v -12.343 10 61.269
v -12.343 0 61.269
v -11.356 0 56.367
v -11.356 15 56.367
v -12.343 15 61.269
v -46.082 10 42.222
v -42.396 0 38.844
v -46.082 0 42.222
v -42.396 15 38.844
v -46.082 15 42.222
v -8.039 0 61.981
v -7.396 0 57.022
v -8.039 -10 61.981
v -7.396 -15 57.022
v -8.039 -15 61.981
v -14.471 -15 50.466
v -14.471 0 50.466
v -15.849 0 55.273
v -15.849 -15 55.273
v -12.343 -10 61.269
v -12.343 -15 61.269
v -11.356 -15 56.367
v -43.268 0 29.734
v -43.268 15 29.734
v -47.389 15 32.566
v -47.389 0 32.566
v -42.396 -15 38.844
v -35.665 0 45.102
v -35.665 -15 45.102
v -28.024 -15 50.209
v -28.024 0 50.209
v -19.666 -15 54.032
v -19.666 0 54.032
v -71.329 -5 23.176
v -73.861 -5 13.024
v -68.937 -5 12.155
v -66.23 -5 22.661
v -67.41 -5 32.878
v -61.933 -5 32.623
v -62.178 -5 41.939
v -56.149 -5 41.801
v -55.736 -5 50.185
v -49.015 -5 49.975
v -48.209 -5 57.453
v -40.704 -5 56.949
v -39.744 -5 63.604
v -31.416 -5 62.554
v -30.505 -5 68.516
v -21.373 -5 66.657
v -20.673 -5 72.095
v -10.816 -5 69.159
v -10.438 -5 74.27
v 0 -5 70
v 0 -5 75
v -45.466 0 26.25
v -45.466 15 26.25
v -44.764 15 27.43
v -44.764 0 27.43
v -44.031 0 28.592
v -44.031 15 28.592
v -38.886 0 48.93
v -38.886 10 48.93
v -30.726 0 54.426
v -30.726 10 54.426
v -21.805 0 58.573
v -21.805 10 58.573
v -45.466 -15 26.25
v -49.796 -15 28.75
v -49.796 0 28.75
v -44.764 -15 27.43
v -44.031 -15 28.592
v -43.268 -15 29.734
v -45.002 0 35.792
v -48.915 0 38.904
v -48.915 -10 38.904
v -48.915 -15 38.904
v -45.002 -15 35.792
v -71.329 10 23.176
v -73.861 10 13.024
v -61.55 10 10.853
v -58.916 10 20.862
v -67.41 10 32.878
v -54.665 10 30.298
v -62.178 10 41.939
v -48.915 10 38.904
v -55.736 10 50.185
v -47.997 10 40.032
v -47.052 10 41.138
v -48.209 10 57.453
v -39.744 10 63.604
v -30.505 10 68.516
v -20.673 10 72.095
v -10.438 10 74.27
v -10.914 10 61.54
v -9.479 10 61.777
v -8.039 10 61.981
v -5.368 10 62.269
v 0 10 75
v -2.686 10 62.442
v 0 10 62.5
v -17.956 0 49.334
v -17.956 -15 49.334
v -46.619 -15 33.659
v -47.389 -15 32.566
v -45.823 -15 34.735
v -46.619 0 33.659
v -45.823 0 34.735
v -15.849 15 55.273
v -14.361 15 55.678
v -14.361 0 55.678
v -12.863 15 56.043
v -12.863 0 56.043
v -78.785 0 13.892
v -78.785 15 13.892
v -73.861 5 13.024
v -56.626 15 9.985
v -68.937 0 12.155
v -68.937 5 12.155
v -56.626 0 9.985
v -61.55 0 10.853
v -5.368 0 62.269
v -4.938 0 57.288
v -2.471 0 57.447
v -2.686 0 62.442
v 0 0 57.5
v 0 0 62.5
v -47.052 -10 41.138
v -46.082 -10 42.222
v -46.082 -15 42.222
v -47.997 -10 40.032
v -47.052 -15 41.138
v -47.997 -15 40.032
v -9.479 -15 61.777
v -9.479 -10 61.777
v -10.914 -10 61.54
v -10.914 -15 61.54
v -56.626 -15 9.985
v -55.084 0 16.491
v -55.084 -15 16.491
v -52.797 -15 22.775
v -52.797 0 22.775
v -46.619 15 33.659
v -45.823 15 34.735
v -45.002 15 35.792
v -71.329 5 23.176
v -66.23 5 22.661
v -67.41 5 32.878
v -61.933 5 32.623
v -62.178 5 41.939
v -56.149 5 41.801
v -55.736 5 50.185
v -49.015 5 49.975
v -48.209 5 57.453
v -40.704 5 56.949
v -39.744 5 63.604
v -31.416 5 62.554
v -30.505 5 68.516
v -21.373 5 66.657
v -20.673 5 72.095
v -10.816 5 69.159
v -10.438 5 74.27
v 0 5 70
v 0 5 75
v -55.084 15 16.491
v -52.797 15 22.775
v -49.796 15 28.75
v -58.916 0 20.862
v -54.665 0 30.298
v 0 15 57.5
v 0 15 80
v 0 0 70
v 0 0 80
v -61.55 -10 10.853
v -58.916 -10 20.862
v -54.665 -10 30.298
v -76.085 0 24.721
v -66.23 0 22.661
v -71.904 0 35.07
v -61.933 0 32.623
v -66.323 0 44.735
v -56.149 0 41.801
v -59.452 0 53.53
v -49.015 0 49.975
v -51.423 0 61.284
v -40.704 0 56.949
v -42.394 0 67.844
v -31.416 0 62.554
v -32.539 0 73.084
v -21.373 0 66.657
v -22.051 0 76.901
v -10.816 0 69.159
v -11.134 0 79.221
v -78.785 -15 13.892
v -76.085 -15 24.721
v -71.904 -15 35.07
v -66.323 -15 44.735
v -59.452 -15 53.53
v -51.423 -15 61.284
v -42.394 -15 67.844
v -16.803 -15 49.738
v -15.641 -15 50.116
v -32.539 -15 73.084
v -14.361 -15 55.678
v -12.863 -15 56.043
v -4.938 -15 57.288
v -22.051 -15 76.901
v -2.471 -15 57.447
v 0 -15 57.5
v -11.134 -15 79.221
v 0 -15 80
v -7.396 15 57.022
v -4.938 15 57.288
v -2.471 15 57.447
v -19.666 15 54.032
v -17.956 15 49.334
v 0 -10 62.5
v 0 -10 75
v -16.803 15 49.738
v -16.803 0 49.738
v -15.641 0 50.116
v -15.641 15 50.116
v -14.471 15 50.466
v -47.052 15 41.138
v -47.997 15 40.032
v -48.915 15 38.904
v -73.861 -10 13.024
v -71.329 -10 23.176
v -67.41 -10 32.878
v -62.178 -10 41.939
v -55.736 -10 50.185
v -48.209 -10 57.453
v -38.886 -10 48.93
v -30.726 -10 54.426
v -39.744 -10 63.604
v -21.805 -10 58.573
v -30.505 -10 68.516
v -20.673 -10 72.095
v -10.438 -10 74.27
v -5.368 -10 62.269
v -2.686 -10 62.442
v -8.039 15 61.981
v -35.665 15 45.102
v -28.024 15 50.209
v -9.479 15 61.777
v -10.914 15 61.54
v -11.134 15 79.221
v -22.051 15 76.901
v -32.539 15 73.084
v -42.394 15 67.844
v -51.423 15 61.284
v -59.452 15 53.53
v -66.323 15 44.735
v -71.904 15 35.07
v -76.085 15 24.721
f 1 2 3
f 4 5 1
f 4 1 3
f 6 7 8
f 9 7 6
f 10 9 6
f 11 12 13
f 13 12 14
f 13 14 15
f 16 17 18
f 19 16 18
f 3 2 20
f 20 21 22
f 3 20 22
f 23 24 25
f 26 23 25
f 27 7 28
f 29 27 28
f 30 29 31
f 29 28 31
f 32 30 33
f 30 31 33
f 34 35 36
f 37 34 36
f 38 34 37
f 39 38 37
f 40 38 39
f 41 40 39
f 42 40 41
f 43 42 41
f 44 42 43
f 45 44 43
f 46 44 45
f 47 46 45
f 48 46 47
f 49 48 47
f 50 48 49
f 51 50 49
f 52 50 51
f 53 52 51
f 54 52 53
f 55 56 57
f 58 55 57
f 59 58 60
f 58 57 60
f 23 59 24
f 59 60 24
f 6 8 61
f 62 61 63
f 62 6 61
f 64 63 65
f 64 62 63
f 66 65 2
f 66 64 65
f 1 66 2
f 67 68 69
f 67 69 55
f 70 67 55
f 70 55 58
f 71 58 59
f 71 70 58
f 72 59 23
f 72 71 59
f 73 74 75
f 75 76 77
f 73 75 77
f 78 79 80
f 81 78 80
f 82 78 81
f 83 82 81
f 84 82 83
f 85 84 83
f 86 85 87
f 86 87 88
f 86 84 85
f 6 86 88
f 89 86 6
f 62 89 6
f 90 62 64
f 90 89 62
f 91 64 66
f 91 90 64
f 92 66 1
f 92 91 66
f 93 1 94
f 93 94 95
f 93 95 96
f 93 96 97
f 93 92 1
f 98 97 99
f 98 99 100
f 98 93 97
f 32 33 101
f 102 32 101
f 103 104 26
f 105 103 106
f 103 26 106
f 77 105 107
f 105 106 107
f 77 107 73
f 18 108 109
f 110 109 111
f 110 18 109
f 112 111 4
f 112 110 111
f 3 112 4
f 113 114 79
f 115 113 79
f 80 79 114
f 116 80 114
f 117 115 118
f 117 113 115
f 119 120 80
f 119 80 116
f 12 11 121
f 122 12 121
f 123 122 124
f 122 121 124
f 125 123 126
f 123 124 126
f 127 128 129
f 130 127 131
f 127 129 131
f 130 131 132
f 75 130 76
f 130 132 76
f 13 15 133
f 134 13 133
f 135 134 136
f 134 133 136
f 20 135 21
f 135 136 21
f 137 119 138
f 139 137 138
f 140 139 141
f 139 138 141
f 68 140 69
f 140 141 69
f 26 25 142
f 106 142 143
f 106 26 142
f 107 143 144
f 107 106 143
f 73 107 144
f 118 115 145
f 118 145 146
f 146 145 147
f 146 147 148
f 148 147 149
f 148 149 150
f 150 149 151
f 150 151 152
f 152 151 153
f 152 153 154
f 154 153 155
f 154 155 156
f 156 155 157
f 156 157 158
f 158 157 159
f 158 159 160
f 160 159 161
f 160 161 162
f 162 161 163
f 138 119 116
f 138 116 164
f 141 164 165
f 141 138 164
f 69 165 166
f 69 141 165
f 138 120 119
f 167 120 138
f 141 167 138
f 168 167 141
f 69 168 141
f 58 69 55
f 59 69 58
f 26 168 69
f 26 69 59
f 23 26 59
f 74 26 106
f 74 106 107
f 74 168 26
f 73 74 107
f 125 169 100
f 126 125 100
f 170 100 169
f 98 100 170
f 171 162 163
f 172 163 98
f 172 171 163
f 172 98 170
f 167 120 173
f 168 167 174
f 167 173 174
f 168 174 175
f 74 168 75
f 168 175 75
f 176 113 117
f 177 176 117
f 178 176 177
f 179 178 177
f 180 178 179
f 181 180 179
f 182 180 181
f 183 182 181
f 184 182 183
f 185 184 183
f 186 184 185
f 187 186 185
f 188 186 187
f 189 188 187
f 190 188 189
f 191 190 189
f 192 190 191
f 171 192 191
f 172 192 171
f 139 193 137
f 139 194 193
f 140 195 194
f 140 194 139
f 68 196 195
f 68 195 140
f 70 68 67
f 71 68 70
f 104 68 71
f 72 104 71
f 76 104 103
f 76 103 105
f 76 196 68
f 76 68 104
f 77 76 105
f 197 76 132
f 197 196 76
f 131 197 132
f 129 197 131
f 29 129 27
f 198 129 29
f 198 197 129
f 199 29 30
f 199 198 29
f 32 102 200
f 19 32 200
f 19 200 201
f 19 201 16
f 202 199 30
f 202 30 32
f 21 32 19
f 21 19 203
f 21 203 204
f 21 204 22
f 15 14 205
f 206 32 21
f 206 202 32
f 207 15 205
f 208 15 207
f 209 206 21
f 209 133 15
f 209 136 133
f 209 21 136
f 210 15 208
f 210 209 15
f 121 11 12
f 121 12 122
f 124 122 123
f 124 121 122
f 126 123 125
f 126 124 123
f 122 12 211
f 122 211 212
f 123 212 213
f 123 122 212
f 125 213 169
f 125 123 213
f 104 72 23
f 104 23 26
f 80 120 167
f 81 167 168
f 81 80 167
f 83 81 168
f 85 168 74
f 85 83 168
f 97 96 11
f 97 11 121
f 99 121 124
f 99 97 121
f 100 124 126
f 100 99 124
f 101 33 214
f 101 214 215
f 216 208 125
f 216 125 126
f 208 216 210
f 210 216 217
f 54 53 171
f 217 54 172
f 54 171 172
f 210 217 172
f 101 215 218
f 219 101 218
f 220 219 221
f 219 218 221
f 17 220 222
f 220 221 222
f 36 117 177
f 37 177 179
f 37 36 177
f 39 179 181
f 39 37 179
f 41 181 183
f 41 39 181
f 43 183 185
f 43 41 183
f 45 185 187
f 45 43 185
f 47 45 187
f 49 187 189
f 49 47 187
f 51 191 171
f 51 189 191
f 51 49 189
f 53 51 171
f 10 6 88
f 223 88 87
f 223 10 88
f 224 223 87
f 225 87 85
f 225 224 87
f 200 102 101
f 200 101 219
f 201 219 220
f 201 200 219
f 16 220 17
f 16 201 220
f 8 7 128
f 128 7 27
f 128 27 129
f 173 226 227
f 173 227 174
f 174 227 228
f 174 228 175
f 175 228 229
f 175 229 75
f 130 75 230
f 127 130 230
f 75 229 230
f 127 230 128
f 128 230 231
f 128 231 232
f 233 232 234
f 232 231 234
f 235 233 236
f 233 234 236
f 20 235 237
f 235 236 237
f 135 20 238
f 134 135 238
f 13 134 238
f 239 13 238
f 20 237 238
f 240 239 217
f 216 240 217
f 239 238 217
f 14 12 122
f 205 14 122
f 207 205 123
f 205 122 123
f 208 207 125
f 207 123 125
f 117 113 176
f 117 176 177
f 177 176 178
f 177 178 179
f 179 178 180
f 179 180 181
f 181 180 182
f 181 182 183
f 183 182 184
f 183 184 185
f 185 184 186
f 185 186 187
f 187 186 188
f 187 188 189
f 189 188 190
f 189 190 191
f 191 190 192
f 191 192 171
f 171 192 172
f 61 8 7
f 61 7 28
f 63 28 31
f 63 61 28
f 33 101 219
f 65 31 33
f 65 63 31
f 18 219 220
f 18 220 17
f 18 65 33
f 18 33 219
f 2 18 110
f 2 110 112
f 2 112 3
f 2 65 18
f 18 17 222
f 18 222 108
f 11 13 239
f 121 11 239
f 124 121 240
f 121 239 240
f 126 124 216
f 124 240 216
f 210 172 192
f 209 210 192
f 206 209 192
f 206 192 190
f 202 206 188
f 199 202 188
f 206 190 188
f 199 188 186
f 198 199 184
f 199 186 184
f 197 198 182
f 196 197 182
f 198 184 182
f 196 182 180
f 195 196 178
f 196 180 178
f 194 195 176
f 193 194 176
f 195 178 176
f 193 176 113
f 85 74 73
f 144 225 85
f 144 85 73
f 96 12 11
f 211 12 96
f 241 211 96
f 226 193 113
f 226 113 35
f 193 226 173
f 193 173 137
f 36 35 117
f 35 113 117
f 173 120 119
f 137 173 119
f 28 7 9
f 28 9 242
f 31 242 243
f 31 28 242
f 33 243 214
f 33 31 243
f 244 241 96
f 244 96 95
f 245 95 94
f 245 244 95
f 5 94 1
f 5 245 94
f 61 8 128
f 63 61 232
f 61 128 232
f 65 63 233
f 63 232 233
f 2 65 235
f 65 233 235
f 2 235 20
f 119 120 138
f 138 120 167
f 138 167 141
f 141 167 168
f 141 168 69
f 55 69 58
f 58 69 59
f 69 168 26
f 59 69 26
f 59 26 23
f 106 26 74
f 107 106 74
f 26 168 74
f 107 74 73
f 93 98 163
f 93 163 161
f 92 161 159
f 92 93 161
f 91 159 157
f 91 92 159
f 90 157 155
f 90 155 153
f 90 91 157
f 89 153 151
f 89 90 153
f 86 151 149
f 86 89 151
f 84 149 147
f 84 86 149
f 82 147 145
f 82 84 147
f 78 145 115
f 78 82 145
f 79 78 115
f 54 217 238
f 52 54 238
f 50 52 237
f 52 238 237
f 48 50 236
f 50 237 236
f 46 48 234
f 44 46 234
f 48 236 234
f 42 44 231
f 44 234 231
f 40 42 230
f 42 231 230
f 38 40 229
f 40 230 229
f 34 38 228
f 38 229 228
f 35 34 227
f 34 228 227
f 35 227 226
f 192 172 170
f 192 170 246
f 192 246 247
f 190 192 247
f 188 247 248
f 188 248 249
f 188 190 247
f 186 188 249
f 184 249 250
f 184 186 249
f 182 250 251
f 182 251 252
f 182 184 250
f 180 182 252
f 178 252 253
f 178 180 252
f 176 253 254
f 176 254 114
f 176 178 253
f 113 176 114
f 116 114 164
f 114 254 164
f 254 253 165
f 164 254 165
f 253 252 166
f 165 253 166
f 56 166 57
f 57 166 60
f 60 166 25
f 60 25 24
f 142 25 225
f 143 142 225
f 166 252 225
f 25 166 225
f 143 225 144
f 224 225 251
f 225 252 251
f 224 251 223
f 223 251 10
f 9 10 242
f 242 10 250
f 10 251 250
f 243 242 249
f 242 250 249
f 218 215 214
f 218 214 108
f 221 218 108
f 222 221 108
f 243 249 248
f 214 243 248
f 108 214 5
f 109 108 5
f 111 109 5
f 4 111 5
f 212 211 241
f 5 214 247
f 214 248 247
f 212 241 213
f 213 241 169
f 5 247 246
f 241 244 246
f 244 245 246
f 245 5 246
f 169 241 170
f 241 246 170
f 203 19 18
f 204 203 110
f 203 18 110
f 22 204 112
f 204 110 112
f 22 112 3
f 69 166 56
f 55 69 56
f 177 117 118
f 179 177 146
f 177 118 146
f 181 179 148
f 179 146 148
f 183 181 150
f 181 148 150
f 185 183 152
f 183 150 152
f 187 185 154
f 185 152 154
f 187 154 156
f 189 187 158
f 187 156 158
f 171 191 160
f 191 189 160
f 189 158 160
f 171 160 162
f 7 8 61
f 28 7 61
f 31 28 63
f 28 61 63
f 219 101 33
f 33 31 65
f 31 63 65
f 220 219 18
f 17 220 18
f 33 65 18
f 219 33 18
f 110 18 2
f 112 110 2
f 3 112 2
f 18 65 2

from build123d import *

# Parameters (mm, degrees)
F1_DEPTH = 10
F3_DEPTH = 5
F5_DEPTH = 15
F8_DEPTH = 15
F9_DEPTH = 25


# Not quite as in the source:
# - a feature names something its author has since deleted; it is built from what else it names


with BuildPart() as f1:
    # F0 (on Front) → F1 (new body, symmetric)
    with BuildSketch(Plane.XZ):
        with BuildLine():
            Line((-62.5, -30), (-62.5, 0))
            Line((-62.5, 0), (-75, 0))
            ThreePointArc((-75, 0), (-73.4179734698, -15.3232232767), (-68.7386354243, -30))
            Line((-68.7386354243, -30), (-62.5, -30))
        make_face()
        with BuildLine():
            ThreePointArc((-68.7386354243, -30), (-73.4179734698, -15.3232232767), (-75, 0))
            Line((-75, 0), (-75, -30))
            Line((-75, -30), (-68.7386354243, -30))
        make_face()
        with BuildLine():
            Line((-75, 0), (-62.5, 0))
            ThreePointArc((-62.5, 0), (-44.1941738242, 44.1941738242), (0, 62.5))
            Line((0, 62.5), (0, 75))
            ThreePointArc((0, 75), (-53.033008589, 53.033008589), (-75, 0))
        make_face()
        with BuildLine():
            ThreePointArc((0, 62.5), (23.9177145228, 57.742470782), (44.1941738242, 44.1941738242))
            Line((44.1941738242, 44.1941738242), (44.1941738242, 56.6941738242))
            Line((44.1941738242, 56.6941738242), (49.0995993303, 56.6941738242))
            ThreePointArc((49.0995993303, 56.6941738242), (26.2005435362, 70.274686185), (0, 75))
            Line((0, 75), (0, 62.5))
        make_face()
        with BuildLine():
            Line((44.1941738242, 56.6941738242), (44.1941738242, 44.1941738242))
            Line((44.1941738242, 44.1941738242), (53.033008589, 53.033008589))
            ThreePointArc((53.033008589, 53.033008589), (51.0991040315, 54.8988302897), (49.0995993303, 56.6941738242))
            Line((49.0995993303, 56.6941738242), (44.1941738242, 56.6941738242))
        make_face()
        with BuildLine():
            ThreePointArc((49.0995993303, 56.6941738242), (51.0991040315, 54.8988302897), (53.033008589, 53.033008589))
            ThreePointArc((53.033008589, 53.033008589), (56.9861303035, 48.7604445533), (60.5959982177, 44.1941738242))
            Line((60.5959982177, 44.1941738242), (79.1941738242, 44.1941738242))
            Line((79.1941738242, 44.1941738242), (79.1941738242, 56.6941738242))
            Line((79.1941738242, 56.6941738242), (49.0995993303, 56.6941738242))
        make_face()
        with BuildLine():
            Line((53.033008589, 53.033008589), (44.1941738242, 44.1941738242))
            Line((44.1941738242, 44.1941738242), (60.5959982177, 44.1941738242))
            ThreePointArc((60.5959982177, 44.1941738242), (56.9861303035, 48.7604445533), (53.033008589, 53.033008589))
        make_face()
    extrude(amount=F1_DEPTH, both=True)

    # F2 (on Front) → F3 (cut, symmetric)
    with BuildSketch(Plane.XZ):
        with BuildLine():
            Line((45.9241320293, 52.8296706156), (49.2044271743, 56.6032185167))
            ThreePointArc((49.2044271743, 56.6032185167), (-31.1019931992, 68.2470953157), (-75, 0))
            Line((-75, 0), (-70, 0))
            ThreePointArc((-70, 0), (-29.0285269859, 63.6972889614), (45.9241320293, 52.8296706156))
        make_face()
    extrude(amount=F3_DEPTH, both=True, mode=Mode.SUBTRACT)


with BuildPart() as f5:
    # F4 (on Front) → F5 (new body)
    with BuildSketch(Plane.XZ):
        with BuildLine():
            ThreePointArc((-56.6264457982, 9.9847702158), (-36.960287557, 44.0475554793), (0, 57.5))
            Line((0, 57.5), (0, 80))
            ThreePointArc((0, 80), (-51.4230087749, 61.2835554495), (-78.784620241, 13.8918542134))
            Line((-78.784620241, 13.8918542134), (-56.6264457982, 9.9847702158))
        make_face()
    extrude(amount=F5_DEPTH)

    # F6: cut F1
    add(f1.part, mode=Mode.SUBTRACT)

    # F7 (on face) → F8 (join, through all)
    with BuildSketch(Plane.XZ.offset(15)):
        with BuildLine():
            ThreePointArc((-47.389204942, 32.5655224887), (-48.6302678935, 30.6813794443), (-49.7964607176, 28.75))
            Line((-49.7964607176, 28.75), (-45.4663336987, 26.25))
            ThreePointArc((-45.4663336987, 26.25), (-44.4015489462, 28.0134334057), (-43.2684045123, 29.7337379245))
            Line((-43.2684045123, 29.7337379245), (-47.389204942, 32.5655224887))
        make_face()
        with BuildLine():
            Line((-14.4709611804, 50.4662390368), (-15.8491479595, 55.2725475165))
            ThreePointArc((-15.8491479595, 55.2725475165), (-17.7684771766, 54.685749687), (-19.6661582412, 54.0323256952))
            Line((-19.6661582412, 54.0323256952), (-17.9560575246, 49.3338625913))
            ThreePointArc((-17.9560575246, 49.3338625913), (-16.2233922047, 49.9304671055), (-14.4709611804, 50.4662390368))
        make_face()
    extrude(amount=-F8_DEPTH)

    # F7 (on face) → F9 (cut)
    with BuildSketch(Plane.XZ.offset(15)):
        with BuildLine():
            Line((-48.9153382675, 38.9042373293), (-45.0021112061, 35.7918983429))
            ThreePointArc((-45.0021112061, 35.7918983429), (-43.7255778977, 37.3406459172), (-42.395771708, 38.8438996663))
            Line((-42.395771708, 38.8438996663), (-46.0823605522, 42.221630072))
            ThreePointArc((-46.0823605522, 42.221630072), (-47.5278020627, 40.5876586056), (-48.9153382675, 38.9042373293))
        make_face()
        with BuildLine():
            ThreePointArc((-11.3558821654, 56.3674901006), (-9.3817674339, 56.7294671209), (-7.396222464, 57.0223280239))
            Line((-7.396222464, 57.0223280239), (-8.0393722435, 61.9807913303))
            ThreePointArc((-8.0393722435, 61.9807913303), (-10.1975732978, 61.6624642618), (-12.3433501798, 61.269010979))
            Line((-12.3433501798, 61.269010979), (-11.3558821654, 56.3674901006))
        make_face()
    extrude(amount=-F9_DEPTH, mode=Mode.SUBTRACT)


with BuildPart() as f10_1:
    # F10: instance of F5
    add(f5.part.mirror(Plane.XZ))


solid = Compound([f5.part, f10_1.part])
